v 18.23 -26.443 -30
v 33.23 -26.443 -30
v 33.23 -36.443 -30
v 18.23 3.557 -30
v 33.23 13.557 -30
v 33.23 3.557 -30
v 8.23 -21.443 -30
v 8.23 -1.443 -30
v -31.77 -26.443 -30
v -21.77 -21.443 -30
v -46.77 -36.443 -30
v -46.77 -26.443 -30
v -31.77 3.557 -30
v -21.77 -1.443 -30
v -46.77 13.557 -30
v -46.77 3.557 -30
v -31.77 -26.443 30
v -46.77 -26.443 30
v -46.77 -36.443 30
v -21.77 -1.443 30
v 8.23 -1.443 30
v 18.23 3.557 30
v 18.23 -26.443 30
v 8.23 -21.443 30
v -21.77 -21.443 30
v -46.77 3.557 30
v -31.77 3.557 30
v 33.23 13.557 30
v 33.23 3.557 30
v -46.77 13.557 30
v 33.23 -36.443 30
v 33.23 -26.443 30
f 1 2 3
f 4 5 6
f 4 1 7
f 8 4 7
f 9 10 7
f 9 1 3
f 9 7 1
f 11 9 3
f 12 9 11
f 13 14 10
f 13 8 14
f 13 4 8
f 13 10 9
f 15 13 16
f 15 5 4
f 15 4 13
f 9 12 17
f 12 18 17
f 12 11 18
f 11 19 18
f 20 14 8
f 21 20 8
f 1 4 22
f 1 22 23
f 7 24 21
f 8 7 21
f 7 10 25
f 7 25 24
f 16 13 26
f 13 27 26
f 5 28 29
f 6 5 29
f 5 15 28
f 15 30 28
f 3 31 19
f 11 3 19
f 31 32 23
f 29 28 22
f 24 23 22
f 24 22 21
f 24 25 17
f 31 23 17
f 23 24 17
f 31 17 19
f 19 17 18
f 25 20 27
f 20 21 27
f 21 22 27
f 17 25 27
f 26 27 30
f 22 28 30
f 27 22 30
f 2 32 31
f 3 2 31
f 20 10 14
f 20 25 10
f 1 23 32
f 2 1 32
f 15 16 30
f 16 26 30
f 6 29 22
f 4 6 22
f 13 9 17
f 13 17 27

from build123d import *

# Parameters (mm, degrees)
SKETCH1_W           = 30
SKETCH1_H           = 20
BOSS_EXTRUDE1_DEPTH = 30


with BuildPart() as part:
    # Sketch1 → Boss-Extrude1 (new, symmetric)
    with BuildSketch(Plane.XY):
        Polygon((33.229508197, -36.442622951), (-46.770491803, -36.442622951), (-46.770491803, -26.442622951), (-31.770491803, -26.442622951), (-31.770491803, 3.557377049), (-46.770491803, 3.557377049), (-46.770491803, 13.557377049), (33.229508197, 13.557377049), (33.229508197, 3.557377049), (18.229508197, 3.557377049), (18.229508197, -26.442622951), (33.229508197, -26.442622951), align=None)
        with Locations((-6.770491803, -11.442622951)):
            Rectangle(SKETCH1_W, SKETCH1_H, mode=Mode.SUBTRACT)
    extrude(amount=BOSS_EXTRUDE1_DEPTH, both=True)


solid = part.part
